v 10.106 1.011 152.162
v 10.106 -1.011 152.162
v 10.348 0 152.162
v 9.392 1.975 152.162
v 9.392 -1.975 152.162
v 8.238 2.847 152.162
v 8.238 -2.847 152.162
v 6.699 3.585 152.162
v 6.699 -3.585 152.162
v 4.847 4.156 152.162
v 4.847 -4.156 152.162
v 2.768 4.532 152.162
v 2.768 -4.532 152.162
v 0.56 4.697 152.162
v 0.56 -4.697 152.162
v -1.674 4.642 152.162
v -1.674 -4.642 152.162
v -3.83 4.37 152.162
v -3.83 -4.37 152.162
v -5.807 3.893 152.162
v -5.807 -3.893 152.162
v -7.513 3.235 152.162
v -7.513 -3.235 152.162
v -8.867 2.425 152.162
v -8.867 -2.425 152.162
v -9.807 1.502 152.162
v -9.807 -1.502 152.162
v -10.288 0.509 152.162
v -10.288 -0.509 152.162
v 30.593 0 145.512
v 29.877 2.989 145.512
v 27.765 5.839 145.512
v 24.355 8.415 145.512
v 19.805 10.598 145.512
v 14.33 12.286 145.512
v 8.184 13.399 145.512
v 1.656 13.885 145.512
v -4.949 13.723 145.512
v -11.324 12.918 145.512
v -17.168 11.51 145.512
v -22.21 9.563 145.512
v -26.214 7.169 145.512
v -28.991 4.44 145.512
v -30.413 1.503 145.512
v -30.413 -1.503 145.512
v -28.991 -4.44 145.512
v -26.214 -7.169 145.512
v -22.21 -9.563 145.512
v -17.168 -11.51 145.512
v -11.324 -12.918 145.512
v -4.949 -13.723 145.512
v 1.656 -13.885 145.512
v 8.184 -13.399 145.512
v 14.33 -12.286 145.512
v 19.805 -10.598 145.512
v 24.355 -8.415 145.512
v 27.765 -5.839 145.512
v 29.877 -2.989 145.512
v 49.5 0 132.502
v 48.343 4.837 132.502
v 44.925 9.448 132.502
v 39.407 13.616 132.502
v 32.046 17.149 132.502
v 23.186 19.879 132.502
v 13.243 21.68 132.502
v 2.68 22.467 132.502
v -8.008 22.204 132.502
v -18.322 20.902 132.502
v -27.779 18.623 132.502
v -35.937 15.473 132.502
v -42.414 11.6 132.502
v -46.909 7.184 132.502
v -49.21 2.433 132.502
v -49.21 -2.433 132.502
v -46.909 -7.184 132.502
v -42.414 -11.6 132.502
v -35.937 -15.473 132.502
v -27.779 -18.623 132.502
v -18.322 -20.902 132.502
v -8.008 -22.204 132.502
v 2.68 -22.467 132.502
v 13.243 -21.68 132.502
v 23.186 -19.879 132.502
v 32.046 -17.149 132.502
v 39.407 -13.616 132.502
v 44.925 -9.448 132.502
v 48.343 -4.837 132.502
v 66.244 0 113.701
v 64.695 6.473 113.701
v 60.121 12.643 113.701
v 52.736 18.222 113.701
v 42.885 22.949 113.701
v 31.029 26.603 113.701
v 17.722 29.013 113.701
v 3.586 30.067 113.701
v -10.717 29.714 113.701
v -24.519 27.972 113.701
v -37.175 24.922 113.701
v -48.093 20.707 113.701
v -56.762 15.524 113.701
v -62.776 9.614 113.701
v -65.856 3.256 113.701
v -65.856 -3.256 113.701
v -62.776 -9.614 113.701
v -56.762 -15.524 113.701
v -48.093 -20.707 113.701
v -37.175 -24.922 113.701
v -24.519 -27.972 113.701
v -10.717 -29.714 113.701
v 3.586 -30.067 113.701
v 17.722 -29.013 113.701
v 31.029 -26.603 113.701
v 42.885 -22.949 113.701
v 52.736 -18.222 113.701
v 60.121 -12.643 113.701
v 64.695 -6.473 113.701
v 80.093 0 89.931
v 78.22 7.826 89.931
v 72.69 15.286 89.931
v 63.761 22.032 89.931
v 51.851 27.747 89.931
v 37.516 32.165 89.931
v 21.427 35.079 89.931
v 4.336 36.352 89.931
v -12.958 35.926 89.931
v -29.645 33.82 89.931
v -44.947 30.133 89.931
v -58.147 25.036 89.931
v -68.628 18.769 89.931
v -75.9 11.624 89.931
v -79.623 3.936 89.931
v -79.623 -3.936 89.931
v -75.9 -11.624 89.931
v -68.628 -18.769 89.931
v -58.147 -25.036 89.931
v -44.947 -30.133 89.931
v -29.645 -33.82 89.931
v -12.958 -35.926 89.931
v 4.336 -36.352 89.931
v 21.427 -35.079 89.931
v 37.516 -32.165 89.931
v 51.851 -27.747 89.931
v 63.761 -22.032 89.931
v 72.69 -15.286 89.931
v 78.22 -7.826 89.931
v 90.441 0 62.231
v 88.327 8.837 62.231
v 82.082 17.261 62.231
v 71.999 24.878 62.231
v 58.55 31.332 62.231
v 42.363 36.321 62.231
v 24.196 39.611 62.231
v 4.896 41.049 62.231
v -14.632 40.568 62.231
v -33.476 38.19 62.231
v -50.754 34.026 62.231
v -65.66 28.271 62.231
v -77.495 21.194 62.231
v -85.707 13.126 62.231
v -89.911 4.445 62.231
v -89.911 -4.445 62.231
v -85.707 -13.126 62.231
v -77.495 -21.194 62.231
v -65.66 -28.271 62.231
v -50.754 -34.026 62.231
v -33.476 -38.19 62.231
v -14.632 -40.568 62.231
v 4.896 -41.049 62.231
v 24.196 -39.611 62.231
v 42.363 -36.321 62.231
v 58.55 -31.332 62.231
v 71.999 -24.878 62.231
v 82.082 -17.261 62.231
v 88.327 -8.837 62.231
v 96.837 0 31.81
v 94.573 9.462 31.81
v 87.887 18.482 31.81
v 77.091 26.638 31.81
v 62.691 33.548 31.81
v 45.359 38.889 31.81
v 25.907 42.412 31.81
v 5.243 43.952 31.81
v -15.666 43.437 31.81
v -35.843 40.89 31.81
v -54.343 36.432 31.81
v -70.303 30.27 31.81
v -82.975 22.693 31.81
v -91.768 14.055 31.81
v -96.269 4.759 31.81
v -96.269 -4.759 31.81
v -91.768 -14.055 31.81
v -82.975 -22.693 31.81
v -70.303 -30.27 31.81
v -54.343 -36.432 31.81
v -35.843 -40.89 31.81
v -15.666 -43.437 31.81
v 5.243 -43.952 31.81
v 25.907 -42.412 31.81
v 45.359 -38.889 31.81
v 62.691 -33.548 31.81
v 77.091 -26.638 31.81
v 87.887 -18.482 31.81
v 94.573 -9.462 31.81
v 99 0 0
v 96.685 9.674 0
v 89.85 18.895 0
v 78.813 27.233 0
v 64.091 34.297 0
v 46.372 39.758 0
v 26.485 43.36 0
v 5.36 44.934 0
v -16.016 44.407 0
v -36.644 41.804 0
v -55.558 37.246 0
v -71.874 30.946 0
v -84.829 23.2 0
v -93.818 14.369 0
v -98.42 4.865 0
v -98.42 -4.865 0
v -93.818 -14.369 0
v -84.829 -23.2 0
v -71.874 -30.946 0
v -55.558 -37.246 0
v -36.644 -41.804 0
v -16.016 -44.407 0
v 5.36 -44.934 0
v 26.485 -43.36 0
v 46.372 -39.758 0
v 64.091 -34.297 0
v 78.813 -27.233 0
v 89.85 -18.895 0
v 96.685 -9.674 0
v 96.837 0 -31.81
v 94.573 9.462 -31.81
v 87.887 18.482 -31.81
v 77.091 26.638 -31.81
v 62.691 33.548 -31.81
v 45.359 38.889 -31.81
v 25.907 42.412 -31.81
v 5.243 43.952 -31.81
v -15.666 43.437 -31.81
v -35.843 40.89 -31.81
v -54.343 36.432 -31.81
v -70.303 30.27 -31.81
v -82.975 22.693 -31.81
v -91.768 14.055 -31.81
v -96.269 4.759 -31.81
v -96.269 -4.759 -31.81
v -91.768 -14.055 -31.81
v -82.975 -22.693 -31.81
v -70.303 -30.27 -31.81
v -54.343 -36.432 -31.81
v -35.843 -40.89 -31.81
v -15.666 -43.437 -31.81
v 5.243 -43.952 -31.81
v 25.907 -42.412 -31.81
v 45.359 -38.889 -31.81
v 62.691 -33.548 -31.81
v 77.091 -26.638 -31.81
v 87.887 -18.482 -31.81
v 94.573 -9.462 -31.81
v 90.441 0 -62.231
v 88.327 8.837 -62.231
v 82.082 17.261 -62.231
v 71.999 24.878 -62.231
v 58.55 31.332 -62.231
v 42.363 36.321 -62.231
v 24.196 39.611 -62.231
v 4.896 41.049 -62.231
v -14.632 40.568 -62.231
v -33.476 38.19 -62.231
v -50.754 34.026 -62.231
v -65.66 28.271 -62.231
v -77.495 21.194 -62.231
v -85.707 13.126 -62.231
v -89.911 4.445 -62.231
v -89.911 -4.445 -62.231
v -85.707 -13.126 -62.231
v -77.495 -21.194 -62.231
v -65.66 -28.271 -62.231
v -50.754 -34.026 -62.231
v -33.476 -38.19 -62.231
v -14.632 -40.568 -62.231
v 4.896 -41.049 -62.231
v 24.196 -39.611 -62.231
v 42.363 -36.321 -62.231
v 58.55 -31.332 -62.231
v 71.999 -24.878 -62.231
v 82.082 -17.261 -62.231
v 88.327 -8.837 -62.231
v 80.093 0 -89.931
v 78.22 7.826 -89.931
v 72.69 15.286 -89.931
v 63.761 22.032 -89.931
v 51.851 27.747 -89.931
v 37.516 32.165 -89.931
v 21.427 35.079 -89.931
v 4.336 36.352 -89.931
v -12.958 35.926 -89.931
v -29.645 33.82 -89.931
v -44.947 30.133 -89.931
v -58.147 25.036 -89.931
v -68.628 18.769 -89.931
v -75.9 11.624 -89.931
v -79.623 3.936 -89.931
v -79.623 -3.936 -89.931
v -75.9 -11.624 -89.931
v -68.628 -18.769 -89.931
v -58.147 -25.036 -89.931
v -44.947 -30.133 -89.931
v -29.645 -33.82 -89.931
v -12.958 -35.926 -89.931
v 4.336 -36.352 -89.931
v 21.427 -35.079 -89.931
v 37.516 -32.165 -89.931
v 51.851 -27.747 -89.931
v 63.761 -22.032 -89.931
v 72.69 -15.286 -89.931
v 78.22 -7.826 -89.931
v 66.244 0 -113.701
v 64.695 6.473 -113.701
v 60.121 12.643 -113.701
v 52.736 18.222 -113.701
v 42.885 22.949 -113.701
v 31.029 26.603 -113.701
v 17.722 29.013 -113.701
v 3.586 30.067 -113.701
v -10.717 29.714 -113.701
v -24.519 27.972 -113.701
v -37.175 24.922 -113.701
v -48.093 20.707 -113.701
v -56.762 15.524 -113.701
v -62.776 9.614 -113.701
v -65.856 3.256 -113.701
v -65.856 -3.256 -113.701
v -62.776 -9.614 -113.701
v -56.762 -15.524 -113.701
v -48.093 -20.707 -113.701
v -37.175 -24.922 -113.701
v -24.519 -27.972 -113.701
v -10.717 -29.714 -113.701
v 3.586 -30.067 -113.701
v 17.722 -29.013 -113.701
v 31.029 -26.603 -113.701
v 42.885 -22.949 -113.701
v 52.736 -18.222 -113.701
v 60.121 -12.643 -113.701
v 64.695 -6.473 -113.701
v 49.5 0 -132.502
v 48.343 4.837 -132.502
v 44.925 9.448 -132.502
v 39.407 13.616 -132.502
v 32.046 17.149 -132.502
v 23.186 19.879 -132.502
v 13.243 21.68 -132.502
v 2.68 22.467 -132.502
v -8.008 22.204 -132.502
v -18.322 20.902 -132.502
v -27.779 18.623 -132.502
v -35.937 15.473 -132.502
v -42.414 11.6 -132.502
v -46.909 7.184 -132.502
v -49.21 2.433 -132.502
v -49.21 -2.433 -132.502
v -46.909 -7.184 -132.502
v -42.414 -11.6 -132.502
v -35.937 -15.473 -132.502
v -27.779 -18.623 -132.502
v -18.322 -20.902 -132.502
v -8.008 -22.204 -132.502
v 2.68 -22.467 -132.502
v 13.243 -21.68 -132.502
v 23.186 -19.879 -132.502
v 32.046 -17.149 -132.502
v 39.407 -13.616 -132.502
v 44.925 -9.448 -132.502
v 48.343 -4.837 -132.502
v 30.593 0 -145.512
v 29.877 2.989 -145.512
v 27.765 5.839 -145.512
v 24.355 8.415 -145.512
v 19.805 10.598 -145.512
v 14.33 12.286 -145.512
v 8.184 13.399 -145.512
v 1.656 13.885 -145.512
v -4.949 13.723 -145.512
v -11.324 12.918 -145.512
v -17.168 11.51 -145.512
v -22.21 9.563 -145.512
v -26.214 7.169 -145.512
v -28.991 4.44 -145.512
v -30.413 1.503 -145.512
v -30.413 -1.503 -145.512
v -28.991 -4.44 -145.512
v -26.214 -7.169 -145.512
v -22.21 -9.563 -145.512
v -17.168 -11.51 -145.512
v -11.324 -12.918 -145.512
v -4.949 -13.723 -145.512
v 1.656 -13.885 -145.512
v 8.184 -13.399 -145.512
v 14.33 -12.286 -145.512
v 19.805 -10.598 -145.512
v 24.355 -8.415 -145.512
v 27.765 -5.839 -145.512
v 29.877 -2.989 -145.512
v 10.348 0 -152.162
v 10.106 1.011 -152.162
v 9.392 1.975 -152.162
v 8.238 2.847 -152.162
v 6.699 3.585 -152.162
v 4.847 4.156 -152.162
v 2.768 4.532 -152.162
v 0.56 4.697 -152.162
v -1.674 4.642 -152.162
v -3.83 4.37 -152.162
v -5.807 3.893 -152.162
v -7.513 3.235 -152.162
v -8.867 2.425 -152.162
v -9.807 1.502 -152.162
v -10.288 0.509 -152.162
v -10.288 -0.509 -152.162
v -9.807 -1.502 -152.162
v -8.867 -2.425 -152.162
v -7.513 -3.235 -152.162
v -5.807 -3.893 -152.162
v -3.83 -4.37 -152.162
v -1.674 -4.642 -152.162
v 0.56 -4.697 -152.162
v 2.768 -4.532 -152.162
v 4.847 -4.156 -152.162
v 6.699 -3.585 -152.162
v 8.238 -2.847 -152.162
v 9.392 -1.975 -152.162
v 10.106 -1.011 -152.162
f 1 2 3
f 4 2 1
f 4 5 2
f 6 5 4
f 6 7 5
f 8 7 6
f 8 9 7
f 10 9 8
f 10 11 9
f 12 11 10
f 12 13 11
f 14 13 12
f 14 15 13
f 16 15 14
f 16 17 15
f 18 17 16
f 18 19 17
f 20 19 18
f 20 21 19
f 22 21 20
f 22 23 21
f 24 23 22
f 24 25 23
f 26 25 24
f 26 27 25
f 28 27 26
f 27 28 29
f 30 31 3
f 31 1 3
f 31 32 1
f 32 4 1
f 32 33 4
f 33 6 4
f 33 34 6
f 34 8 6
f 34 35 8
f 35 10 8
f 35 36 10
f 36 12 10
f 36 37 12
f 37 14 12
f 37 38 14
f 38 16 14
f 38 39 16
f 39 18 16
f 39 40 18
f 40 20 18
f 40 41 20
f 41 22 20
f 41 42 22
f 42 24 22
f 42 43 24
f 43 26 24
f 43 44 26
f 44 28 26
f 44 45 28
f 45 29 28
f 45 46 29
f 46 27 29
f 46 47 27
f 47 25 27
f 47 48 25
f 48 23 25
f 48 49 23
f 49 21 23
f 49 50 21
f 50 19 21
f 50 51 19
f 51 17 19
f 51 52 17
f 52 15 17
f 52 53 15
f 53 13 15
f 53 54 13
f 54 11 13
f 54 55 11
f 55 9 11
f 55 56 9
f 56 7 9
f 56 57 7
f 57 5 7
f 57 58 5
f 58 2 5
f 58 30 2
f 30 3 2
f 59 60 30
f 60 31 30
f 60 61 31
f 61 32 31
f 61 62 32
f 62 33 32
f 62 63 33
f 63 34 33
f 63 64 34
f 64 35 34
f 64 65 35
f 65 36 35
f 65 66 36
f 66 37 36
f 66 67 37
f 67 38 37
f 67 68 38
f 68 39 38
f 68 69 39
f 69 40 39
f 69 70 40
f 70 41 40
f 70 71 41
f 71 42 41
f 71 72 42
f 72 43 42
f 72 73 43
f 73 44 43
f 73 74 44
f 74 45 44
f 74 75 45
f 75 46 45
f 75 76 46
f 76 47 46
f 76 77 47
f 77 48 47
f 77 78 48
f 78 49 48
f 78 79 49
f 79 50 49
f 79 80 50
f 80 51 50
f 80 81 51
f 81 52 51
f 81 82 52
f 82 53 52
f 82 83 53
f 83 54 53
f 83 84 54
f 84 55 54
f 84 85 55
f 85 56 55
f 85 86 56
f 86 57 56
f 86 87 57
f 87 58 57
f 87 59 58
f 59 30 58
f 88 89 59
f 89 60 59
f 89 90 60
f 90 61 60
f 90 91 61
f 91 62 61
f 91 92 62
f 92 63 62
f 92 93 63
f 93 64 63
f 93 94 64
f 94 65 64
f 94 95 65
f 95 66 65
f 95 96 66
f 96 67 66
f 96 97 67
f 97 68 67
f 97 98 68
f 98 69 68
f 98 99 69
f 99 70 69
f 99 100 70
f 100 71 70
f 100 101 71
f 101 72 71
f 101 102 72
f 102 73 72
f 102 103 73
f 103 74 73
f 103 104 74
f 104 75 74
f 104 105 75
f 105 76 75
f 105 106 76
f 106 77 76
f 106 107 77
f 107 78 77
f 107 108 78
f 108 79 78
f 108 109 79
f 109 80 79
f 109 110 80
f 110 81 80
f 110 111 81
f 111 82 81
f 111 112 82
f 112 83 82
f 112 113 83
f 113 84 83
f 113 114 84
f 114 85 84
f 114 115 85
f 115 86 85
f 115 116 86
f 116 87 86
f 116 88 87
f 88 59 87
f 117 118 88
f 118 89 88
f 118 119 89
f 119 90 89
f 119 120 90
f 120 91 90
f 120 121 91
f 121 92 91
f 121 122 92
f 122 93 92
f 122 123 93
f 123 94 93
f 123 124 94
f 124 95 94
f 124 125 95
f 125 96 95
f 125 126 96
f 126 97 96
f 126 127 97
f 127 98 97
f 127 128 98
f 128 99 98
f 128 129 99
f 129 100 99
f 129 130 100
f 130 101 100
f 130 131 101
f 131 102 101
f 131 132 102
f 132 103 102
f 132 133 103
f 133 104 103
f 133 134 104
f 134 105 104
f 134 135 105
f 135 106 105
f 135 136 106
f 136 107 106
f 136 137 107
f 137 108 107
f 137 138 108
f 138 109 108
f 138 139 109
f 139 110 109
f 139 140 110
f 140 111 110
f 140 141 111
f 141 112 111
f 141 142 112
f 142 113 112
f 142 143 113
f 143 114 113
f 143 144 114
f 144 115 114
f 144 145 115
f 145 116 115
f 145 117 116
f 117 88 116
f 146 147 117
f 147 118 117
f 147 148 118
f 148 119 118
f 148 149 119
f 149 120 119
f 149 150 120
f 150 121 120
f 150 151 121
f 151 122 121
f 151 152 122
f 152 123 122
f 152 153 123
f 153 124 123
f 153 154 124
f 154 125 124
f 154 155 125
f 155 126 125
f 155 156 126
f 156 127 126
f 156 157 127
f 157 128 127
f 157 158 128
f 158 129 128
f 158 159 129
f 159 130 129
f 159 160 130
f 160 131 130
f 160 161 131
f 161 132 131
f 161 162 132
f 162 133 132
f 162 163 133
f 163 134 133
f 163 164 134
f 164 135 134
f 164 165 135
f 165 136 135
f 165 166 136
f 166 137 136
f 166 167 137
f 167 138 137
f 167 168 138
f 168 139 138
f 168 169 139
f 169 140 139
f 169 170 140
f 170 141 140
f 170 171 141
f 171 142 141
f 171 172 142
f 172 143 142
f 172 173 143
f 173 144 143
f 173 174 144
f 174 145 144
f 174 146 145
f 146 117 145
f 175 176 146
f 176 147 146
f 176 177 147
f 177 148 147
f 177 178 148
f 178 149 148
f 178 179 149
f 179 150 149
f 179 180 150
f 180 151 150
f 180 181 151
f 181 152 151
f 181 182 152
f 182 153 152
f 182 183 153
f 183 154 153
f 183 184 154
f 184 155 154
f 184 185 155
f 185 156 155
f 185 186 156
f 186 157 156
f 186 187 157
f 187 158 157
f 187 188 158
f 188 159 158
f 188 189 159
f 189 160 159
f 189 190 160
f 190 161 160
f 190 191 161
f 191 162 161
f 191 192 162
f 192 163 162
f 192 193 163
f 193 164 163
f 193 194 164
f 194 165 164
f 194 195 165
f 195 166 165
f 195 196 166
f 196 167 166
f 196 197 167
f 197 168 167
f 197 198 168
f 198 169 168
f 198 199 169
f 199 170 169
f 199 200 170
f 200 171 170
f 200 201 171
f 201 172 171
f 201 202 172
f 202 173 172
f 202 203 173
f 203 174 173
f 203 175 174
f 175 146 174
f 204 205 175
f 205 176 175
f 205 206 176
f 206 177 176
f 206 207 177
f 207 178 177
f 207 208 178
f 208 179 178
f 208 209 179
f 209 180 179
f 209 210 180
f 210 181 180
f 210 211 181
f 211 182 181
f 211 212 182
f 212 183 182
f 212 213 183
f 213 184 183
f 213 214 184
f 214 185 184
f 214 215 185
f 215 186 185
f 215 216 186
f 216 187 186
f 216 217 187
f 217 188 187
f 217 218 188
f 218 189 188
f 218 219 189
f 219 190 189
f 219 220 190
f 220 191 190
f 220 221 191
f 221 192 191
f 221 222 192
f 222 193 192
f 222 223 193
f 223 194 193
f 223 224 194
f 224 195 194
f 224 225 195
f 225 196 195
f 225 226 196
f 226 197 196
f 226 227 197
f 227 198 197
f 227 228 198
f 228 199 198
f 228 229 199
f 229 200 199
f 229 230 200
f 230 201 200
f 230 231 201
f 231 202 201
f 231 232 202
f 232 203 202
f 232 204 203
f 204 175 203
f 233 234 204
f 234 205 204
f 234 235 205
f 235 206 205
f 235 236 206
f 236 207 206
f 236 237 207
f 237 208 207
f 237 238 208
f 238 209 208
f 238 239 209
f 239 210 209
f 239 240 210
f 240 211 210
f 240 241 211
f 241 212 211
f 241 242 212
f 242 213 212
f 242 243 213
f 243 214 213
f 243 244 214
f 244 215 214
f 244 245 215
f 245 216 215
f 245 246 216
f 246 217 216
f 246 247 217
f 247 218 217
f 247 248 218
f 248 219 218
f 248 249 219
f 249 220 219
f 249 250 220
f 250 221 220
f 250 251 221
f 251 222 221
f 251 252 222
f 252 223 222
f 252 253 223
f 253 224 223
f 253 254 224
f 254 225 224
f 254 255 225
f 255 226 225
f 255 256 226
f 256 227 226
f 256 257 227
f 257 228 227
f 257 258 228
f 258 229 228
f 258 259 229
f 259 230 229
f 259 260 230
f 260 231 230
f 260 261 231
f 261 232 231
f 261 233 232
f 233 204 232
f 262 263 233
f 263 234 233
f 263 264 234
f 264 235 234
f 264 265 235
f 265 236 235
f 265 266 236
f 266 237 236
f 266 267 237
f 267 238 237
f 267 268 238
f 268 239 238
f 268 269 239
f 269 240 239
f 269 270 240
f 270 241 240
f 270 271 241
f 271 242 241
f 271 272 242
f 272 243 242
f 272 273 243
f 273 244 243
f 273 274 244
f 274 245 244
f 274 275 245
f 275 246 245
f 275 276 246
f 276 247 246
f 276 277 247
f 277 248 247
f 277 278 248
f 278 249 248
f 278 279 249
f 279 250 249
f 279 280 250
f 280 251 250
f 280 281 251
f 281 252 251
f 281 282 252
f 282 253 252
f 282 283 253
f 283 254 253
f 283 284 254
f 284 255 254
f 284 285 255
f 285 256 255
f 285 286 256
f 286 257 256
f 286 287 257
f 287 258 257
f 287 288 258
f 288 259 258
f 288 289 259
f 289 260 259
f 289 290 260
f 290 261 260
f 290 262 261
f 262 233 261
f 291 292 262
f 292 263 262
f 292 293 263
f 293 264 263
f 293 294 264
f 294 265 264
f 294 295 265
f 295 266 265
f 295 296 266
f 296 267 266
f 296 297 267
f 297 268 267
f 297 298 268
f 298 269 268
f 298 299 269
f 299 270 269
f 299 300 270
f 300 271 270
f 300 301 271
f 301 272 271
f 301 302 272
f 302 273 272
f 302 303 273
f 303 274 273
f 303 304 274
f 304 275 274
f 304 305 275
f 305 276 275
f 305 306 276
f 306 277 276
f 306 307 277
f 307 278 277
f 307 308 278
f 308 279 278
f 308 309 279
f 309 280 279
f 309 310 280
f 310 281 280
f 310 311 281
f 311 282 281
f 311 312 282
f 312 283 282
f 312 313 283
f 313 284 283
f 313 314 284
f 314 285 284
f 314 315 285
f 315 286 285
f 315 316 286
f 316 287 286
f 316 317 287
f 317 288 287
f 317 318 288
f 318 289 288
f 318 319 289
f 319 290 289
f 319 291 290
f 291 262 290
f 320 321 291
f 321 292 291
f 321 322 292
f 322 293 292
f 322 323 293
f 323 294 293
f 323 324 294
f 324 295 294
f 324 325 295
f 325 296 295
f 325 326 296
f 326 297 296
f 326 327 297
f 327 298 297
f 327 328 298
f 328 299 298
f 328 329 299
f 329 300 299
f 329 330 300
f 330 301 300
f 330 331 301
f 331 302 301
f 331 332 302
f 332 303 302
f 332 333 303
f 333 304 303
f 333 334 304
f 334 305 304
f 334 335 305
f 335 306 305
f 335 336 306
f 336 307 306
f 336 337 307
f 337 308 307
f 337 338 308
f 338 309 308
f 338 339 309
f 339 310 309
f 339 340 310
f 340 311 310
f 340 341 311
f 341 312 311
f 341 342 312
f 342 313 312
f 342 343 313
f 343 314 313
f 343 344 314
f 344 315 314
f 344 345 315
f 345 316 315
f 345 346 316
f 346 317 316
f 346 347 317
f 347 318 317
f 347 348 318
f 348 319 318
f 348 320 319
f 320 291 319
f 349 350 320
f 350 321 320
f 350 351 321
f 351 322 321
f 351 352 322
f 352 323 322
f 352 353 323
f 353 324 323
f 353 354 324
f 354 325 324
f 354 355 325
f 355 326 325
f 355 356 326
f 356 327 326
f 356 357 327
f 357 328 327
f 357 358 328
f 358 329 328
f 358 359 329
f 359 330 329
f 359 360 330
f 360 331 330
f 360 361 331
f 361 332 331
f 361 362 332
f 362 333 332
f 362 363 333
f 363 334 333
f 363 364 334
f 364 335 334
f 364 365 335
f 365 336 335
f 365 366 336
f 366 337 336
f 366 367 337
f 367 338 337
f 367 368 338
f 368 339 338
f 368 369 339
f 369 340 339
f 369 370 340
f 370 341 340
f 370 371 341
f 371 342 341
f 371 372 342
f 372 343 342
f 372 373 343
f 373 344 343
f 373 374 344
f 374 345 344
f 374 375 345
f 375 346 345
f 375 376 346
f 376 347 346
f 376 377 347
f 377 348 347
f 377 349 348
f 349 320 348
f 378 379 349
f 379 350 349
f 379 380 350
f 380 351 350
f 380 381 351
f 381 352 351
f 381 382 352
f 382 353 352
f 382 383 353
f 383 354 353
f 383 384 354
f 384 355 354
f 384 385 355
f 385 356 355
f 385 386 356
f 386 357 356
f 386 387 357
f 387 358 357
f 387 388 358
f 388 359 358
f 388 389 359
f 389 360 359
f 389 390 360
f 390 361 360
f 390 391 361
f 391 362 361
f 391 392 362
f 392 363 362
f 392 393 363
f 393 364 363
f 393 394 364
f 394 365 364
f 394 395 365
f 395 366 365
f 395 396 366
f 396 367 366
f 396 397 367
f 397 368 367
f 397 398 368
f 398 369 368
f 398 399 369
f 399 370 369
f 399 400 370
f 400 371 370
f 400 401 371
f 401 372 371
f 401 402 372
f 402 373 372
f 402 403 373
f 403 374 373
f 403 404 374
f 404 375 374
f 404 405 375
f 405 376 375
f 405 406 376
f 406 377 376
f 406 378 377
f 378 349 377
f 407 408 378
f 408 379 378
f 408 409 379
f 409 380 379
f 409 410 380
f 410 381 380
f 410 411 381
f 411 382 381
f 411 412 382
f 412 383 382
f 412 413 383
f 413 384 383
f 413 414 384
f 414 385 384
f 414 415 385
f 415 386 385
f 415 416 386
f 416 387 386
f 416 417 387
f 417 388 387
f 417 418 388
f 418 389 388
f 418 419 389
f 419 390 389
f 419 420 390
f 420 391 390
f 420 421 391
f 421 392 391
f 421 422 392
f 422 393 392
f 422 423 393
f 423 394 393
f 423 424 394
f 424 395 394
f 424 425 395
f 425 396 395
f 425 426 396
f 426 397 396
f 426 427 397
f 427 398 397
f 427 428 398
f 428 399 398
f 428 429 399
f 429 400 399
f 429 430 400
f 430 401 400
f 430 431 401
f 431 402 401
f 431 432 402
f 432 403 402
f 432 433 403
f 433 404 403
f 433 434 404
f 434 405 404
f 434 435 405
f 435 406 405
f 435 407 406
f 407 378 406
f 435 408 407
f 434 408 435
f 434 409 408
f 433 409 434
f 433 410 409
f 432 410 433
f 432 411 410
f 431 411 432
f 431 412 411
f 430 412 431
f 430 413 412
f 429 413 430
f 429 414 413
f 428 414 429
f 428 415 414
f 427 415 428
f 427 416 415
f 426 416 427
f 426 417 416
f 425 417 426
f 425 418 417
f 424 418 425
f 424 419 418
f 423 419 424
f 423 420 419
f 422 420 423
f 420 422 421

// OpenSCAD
// Generated by SolidPython 1.0.1 on 2020-07-29 00:46:49


scale(v = [11, 5, 17]) {
	sphere(r = 9);
}
/***********************************************
*********      SolidPython code:      **********
************************************************
 
# import packages: SolidPython
from solid import *
from solid.utils import *
from itertools import chain, combinations, permutations


class Resize:

    def __init__(self, scad_file):
        self.scad_file = scad_file
        #self.scad_file = import_scad(scad_file)
        # cone/cylinder param:
        self.r1 = 0
        self.r2 = 0
        self.h = 0
        # rectangular prism param:
        self.w = 0
        self.l = 0
        # ellipse param:
        self.r = 0

    # import OpenScad code (file name corresponds to shape)


    # classify shape + parameters
    def assign(self, param1, param2, param3):
        if self.scad_file == 'cone.scad':
            self.r1 = param1
            self.r2 = param2
            self.h = param3
        elif self.scad_file == 'cylinder.scad':
            self.r1 = param1
            self.r2 = param2
            self.h = param3
        elif self.scad_file == 'rectangularPrism.scad':
            self.h = param1
            self.l = param2
            self.w = param3
        else:
            self.r = param1
            self.h = param2

    # resize parameters
    def iterate(self):
        x = range(3, 20, 2)
        i = 1
        if self.scad_file == 'cone.scad':
            tempList = list(permutations(x, 2))
            for temp in tempList:
                param1 = temp[0]
                param2 = temp[1]
                filepath = 'produced_scad_files/' + 'cone' + str(param1) + '_' + str(param2) + '_' + '.scad'
                scad_render_to_file(cylinder(h=param1, r1=param2, r2=0), filepath)

        elif self.scad_file == 'cylinder.scad':
            tempList = list(permutations(x, 3))
            for temp in tempList:
                param1 = temp[0]
                param2 = temp[1]
                filepath = 'produced_scad_files/' + 'cylinder' + str(param1) + '_' + str(param2) + '_' + '.scad'
                scad_render_to_file(cylinder(h=param1, r1=param2, r2=param2), filepath)

        elif self.scad_file == 'rectangularPrism.scad':
            tempList = list(permutations(x, 3))
            for temp in tempList:
                param1 = temp[0]
                param2 = temp[1]
                param3 = temp[2]
                filepath = 'produced_scad_files/' + 'rectangularPrism' + str(param1) + '_' + str(param2) + '_' + str(
                    param3) + '.scad'
                scad_render_to_file(cube(size=(param1, param2, param3)), filepath)

        elif self.scad_file == 'ellipse.scad':
            tempList = list(permutations(x, 4))
            for temp in tempList:
                param1 = temp[0]
                param2 = temp[1]
                param3 = temp[2]
                param4 = temp[3]
                filepath = 'produced_scad_files/' + 'ellipse' + str(param1) + '_' + str(param2) + '_' + str(param3) + '_' + str(param4) + '.scad'
                scad_render_to_file(scale([param1, param2, param3])(sphere(r=param4)), filepath)

    def render_to_scadfile(self):
        scad_render_to_file(scad, 'example.scad') 
 
************************************************/
